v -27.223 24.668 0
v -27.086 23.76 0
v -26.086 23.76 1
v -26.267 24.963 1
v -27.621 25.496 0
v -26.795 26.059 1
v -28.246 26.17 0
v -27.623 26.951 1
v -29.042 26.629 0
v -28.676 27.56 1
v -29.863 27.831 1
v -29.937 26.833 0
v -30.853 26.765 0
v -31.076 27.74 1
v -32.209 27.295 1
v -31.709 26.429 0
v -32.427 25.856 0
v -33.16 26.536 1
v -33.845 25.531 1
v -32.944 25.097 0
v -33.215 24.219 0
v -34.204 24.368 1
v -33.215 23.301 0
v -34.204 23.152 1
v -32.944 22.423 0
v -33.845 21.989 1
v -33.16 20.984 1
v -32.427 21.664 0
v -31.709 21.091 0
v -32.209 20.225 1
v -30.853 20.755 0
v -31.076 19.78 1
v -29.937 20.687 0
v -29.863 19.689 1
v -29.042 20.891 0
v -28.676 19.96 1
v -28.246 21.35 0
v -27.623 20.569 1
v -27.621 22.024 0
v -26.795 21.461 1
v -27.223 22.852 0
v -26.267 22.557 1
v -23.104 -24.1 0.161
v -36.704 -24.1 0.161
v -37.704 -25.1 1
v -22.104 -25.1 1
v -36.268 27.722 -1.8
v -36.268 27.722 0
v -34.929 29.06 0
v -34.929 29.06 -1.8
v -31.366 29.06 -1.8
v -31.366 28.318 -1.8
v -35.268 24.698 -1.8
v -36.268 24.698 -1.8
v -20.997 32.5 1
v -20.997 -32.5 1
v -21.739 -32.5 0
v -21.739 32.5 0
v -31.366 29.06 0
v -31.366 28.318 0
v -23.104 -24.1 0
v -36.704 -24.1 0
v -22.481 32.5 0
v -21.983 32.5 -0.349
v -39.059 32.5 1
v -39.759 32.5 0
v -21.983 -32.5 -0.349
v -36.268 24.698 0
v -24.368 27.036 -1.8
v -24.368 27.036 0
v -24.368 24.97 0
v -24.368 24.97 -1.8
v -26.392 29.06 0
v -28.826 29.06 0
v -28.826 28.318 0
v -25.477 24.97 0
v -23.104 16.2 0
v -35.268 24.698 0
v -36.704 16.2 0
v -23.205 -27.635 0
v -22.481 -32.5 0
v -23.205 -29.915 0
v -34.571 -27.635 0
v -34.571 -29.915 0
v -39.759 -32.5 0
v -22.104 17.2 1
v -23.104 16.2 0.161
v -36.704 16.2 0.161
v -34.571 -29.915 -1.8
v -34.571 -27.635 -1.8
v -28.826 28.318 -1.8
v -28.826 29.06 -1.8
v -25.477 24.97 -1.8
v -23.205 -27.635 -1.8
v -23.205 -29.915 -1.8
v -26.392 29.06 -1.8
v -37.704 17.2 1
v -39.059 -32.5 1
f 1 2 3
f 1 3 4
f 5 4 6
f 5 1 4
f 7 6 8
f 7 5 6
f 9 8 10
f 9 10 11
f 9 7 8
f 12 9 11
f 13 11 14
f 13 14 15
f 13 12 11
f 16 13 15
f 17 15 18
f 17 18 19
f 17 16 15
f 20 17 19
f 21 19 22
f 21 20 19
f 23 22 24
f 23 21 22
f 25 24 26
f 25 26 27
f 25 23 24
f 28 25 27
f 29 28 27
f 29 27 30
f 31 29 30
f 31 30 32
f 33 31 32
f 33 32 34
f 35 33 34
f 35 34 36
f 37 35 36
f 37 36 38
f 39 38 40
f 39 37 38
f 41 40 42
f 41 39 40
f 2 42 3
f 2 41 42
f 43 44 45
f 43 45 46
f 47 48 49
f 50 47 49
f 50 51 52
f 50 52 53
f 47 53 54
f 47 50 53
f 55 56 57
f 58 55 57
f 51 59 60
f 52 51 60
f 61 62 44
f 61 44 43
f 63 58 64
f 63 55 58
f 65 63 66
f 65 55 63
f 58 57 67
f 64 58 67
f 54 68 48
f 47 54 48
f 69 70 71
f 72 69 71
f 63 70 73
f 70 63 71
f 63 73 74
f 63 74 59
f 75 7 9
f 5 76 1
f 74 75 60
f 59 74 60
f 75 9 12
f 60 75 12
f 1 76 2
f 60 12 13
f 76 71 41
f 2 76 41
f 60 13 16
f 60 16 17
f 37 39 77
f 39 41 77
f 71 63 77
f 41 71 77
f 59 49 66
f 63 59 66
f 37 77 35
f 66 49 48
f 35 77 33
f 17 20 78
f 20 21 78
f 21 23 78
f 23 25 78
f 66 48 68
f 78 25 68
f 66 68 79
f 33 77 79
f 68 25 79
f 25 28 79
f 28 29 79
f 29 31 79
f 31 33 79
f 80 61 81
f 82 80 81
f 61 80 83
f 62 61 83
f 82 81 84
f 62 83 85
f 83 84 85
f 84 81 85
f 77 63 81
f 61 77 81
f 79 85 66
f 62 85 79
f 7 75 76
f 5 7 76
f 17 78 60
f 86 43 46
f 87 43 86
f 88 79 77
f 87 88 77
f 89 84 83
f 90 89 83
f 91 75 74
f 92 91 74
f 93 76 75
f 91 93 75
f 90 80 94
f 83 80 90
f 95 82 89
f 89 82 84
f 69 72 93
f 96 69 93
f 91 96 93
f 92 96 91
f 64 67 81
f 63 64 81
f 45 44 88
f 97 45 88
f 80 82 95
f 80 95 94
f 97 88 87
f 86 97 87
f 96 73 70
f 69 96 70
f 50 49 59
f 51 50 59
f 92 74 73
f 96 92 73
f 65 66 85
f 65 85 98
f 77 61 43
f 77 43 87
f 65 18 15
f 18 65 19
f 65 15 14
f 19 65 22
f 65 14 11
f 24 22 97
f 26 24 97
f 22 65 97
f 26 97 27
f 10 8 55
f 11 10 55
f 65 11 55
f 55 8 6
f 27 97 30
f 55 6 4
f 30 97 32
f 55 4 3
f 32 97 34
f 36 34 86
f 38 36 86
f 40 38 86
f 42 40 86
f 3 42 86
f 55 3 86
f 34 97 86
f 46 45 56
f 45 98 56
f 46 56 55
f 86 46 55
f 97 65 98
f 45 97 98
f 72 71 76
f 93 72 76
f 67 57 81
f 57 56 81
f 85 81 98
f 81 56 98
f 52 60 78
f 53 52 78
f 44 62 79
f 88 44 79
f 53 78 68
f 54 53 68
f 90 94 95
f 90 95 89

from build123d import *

# Parameters (mm, degrees)
SKETCH_1_W          = 17.278028126
SKETCH_1_H          = 65
SKETCH_1_R          = 3.082023979
SKETCH_1_W_2        = 13.6
SKETCH_1_H_2        = 40.3
EXTRUDE_1_DEPTH     = 1
SKETCH_2_W          = 11.366651046
SKETCH_2_H          = 2.279902362
EXTRUDE_2_DEPTH     = 1.8
EXTRUDE_3_DEPTH     = 65
CUT_EXTRUDE_1_DEPTH = 65
EXTRUDE_4_DEPTH     = 65
CHAMFER_1_SIZE      = 1
CHAMFER_2_SIZE      = 1
CHAMFER_2_SIZE2     = 0.839099631


with BuildPart() as part:
    # 草图1 → 凸台-拉伸1 (new body)
    with BuildSketch(Plane.XY):
        with Locations((-31.11996815, 0)):
            Rectangle(SKETCH_1_W, SKETCH_1_H)
        with Locations((-30.167658157, 23.76)):
            Circle(SKETCH_1_R, mode=Mode.SUBTRACT)
        with Locations((-29.904282539, -3.95)):
            Rectangle(SKETCH_1_W_2, SKETCH_1_H_2, mode=Mode.SUBTRACT)
    extrude(amount=EXTRUDE_1_DEPTH)

    # 草图2 → 凸台-拉伸2 (add)
    with BuildSketch(Plane(origin=(0, 0, 0), x_dir=(-1, 0, 0), z_dir=(0, 0, -1))):
        Polygon((36.267658157, 24.697593501), (36.267658157, 27.721628521), (34.929286678, 29.06), (31.365999463, 29.06), (31.365999463, 28.318477538), (35.267658157, 24.697593501), align=None)
        Polygon((28.825820559, 29.06), (26.391624704, 29.06), (24.367658157, 27.036033454), (24.367658157, 24.969921966), (25.477264987, 24.969921966), (28.825820559, 28.318477538), align=None)
        with Locations((28.887927563, -28.775129659)):
            Rectangle(SKETCH_2_W, SKETCH_2_H)
    extrude(amount=EXTRUDE_2_DEPTH)

    # 草图3 → 凸台-拉伸3 (add)
    with BuildSketch(Plane.XZ.offset(32.5)):
        Polygon((-22.480954087, 1), (-20.997208948, 1), (-21.739081518, 0), (-22.480954087, 0), align=None)
    extrude(amount=-EXTRUDE_3_DEPTH)

    # 草图4 → 切除-拉伸1 (cut)
    with BuildSketch(Plane.XZ.offset(32.5)):
        Polygon((-39.758982213, 0), (-39.058774675, 1), (-39.758982213, 1), align=None)
    extrude(amount=-CUT_EXTRUDE_1_DEPTH, mode=Mode.SUBTRACT)

    # 草图5 → 凸台-拉伸4 (add)
    with BuildSketch(Plane.XZ.offset(32.5)):
        Polygon((-21.739081518, 0), (-21.983150121, -0.34856609), (-22.480954087, 0), align=None)
    extrude(amount=-EXTRUDE_4_DEPTH)

    # 倒角1
    chamfer_1_edges = [part.edges().sort_by_distance(p)[0] for p in [
        (-33.249682136, 23.76, 1),
    ]]
    chamfer(chamfer_1_edges, length=CHAMFER_1_SIZE - 0.0001)  # a hair under: the kernel refuses the full size

    # 倒角2
    chamfer_2_edges = [part.edges().sort_by_distance(p)[0] for p in [
        (-36.704282539, -3.95, 1),
        (-29.904282539, -24.1, 1),
        (-23.104282539, -3.95, 1),
        (-29.904282539, 16.2, 1),
    ]]
    chamfer_2_side = [part.faces().sort_by_distance(p)[0] for p in [
        (-34.924209452, 23.76, 1),
    ]]
    chamfer(chamfer_2_edges, length=CHAMFER_2_SIZE, length2=CHAMFER_2_SIZE2, reference=chamfer_2_side[0])


solid = part.part
